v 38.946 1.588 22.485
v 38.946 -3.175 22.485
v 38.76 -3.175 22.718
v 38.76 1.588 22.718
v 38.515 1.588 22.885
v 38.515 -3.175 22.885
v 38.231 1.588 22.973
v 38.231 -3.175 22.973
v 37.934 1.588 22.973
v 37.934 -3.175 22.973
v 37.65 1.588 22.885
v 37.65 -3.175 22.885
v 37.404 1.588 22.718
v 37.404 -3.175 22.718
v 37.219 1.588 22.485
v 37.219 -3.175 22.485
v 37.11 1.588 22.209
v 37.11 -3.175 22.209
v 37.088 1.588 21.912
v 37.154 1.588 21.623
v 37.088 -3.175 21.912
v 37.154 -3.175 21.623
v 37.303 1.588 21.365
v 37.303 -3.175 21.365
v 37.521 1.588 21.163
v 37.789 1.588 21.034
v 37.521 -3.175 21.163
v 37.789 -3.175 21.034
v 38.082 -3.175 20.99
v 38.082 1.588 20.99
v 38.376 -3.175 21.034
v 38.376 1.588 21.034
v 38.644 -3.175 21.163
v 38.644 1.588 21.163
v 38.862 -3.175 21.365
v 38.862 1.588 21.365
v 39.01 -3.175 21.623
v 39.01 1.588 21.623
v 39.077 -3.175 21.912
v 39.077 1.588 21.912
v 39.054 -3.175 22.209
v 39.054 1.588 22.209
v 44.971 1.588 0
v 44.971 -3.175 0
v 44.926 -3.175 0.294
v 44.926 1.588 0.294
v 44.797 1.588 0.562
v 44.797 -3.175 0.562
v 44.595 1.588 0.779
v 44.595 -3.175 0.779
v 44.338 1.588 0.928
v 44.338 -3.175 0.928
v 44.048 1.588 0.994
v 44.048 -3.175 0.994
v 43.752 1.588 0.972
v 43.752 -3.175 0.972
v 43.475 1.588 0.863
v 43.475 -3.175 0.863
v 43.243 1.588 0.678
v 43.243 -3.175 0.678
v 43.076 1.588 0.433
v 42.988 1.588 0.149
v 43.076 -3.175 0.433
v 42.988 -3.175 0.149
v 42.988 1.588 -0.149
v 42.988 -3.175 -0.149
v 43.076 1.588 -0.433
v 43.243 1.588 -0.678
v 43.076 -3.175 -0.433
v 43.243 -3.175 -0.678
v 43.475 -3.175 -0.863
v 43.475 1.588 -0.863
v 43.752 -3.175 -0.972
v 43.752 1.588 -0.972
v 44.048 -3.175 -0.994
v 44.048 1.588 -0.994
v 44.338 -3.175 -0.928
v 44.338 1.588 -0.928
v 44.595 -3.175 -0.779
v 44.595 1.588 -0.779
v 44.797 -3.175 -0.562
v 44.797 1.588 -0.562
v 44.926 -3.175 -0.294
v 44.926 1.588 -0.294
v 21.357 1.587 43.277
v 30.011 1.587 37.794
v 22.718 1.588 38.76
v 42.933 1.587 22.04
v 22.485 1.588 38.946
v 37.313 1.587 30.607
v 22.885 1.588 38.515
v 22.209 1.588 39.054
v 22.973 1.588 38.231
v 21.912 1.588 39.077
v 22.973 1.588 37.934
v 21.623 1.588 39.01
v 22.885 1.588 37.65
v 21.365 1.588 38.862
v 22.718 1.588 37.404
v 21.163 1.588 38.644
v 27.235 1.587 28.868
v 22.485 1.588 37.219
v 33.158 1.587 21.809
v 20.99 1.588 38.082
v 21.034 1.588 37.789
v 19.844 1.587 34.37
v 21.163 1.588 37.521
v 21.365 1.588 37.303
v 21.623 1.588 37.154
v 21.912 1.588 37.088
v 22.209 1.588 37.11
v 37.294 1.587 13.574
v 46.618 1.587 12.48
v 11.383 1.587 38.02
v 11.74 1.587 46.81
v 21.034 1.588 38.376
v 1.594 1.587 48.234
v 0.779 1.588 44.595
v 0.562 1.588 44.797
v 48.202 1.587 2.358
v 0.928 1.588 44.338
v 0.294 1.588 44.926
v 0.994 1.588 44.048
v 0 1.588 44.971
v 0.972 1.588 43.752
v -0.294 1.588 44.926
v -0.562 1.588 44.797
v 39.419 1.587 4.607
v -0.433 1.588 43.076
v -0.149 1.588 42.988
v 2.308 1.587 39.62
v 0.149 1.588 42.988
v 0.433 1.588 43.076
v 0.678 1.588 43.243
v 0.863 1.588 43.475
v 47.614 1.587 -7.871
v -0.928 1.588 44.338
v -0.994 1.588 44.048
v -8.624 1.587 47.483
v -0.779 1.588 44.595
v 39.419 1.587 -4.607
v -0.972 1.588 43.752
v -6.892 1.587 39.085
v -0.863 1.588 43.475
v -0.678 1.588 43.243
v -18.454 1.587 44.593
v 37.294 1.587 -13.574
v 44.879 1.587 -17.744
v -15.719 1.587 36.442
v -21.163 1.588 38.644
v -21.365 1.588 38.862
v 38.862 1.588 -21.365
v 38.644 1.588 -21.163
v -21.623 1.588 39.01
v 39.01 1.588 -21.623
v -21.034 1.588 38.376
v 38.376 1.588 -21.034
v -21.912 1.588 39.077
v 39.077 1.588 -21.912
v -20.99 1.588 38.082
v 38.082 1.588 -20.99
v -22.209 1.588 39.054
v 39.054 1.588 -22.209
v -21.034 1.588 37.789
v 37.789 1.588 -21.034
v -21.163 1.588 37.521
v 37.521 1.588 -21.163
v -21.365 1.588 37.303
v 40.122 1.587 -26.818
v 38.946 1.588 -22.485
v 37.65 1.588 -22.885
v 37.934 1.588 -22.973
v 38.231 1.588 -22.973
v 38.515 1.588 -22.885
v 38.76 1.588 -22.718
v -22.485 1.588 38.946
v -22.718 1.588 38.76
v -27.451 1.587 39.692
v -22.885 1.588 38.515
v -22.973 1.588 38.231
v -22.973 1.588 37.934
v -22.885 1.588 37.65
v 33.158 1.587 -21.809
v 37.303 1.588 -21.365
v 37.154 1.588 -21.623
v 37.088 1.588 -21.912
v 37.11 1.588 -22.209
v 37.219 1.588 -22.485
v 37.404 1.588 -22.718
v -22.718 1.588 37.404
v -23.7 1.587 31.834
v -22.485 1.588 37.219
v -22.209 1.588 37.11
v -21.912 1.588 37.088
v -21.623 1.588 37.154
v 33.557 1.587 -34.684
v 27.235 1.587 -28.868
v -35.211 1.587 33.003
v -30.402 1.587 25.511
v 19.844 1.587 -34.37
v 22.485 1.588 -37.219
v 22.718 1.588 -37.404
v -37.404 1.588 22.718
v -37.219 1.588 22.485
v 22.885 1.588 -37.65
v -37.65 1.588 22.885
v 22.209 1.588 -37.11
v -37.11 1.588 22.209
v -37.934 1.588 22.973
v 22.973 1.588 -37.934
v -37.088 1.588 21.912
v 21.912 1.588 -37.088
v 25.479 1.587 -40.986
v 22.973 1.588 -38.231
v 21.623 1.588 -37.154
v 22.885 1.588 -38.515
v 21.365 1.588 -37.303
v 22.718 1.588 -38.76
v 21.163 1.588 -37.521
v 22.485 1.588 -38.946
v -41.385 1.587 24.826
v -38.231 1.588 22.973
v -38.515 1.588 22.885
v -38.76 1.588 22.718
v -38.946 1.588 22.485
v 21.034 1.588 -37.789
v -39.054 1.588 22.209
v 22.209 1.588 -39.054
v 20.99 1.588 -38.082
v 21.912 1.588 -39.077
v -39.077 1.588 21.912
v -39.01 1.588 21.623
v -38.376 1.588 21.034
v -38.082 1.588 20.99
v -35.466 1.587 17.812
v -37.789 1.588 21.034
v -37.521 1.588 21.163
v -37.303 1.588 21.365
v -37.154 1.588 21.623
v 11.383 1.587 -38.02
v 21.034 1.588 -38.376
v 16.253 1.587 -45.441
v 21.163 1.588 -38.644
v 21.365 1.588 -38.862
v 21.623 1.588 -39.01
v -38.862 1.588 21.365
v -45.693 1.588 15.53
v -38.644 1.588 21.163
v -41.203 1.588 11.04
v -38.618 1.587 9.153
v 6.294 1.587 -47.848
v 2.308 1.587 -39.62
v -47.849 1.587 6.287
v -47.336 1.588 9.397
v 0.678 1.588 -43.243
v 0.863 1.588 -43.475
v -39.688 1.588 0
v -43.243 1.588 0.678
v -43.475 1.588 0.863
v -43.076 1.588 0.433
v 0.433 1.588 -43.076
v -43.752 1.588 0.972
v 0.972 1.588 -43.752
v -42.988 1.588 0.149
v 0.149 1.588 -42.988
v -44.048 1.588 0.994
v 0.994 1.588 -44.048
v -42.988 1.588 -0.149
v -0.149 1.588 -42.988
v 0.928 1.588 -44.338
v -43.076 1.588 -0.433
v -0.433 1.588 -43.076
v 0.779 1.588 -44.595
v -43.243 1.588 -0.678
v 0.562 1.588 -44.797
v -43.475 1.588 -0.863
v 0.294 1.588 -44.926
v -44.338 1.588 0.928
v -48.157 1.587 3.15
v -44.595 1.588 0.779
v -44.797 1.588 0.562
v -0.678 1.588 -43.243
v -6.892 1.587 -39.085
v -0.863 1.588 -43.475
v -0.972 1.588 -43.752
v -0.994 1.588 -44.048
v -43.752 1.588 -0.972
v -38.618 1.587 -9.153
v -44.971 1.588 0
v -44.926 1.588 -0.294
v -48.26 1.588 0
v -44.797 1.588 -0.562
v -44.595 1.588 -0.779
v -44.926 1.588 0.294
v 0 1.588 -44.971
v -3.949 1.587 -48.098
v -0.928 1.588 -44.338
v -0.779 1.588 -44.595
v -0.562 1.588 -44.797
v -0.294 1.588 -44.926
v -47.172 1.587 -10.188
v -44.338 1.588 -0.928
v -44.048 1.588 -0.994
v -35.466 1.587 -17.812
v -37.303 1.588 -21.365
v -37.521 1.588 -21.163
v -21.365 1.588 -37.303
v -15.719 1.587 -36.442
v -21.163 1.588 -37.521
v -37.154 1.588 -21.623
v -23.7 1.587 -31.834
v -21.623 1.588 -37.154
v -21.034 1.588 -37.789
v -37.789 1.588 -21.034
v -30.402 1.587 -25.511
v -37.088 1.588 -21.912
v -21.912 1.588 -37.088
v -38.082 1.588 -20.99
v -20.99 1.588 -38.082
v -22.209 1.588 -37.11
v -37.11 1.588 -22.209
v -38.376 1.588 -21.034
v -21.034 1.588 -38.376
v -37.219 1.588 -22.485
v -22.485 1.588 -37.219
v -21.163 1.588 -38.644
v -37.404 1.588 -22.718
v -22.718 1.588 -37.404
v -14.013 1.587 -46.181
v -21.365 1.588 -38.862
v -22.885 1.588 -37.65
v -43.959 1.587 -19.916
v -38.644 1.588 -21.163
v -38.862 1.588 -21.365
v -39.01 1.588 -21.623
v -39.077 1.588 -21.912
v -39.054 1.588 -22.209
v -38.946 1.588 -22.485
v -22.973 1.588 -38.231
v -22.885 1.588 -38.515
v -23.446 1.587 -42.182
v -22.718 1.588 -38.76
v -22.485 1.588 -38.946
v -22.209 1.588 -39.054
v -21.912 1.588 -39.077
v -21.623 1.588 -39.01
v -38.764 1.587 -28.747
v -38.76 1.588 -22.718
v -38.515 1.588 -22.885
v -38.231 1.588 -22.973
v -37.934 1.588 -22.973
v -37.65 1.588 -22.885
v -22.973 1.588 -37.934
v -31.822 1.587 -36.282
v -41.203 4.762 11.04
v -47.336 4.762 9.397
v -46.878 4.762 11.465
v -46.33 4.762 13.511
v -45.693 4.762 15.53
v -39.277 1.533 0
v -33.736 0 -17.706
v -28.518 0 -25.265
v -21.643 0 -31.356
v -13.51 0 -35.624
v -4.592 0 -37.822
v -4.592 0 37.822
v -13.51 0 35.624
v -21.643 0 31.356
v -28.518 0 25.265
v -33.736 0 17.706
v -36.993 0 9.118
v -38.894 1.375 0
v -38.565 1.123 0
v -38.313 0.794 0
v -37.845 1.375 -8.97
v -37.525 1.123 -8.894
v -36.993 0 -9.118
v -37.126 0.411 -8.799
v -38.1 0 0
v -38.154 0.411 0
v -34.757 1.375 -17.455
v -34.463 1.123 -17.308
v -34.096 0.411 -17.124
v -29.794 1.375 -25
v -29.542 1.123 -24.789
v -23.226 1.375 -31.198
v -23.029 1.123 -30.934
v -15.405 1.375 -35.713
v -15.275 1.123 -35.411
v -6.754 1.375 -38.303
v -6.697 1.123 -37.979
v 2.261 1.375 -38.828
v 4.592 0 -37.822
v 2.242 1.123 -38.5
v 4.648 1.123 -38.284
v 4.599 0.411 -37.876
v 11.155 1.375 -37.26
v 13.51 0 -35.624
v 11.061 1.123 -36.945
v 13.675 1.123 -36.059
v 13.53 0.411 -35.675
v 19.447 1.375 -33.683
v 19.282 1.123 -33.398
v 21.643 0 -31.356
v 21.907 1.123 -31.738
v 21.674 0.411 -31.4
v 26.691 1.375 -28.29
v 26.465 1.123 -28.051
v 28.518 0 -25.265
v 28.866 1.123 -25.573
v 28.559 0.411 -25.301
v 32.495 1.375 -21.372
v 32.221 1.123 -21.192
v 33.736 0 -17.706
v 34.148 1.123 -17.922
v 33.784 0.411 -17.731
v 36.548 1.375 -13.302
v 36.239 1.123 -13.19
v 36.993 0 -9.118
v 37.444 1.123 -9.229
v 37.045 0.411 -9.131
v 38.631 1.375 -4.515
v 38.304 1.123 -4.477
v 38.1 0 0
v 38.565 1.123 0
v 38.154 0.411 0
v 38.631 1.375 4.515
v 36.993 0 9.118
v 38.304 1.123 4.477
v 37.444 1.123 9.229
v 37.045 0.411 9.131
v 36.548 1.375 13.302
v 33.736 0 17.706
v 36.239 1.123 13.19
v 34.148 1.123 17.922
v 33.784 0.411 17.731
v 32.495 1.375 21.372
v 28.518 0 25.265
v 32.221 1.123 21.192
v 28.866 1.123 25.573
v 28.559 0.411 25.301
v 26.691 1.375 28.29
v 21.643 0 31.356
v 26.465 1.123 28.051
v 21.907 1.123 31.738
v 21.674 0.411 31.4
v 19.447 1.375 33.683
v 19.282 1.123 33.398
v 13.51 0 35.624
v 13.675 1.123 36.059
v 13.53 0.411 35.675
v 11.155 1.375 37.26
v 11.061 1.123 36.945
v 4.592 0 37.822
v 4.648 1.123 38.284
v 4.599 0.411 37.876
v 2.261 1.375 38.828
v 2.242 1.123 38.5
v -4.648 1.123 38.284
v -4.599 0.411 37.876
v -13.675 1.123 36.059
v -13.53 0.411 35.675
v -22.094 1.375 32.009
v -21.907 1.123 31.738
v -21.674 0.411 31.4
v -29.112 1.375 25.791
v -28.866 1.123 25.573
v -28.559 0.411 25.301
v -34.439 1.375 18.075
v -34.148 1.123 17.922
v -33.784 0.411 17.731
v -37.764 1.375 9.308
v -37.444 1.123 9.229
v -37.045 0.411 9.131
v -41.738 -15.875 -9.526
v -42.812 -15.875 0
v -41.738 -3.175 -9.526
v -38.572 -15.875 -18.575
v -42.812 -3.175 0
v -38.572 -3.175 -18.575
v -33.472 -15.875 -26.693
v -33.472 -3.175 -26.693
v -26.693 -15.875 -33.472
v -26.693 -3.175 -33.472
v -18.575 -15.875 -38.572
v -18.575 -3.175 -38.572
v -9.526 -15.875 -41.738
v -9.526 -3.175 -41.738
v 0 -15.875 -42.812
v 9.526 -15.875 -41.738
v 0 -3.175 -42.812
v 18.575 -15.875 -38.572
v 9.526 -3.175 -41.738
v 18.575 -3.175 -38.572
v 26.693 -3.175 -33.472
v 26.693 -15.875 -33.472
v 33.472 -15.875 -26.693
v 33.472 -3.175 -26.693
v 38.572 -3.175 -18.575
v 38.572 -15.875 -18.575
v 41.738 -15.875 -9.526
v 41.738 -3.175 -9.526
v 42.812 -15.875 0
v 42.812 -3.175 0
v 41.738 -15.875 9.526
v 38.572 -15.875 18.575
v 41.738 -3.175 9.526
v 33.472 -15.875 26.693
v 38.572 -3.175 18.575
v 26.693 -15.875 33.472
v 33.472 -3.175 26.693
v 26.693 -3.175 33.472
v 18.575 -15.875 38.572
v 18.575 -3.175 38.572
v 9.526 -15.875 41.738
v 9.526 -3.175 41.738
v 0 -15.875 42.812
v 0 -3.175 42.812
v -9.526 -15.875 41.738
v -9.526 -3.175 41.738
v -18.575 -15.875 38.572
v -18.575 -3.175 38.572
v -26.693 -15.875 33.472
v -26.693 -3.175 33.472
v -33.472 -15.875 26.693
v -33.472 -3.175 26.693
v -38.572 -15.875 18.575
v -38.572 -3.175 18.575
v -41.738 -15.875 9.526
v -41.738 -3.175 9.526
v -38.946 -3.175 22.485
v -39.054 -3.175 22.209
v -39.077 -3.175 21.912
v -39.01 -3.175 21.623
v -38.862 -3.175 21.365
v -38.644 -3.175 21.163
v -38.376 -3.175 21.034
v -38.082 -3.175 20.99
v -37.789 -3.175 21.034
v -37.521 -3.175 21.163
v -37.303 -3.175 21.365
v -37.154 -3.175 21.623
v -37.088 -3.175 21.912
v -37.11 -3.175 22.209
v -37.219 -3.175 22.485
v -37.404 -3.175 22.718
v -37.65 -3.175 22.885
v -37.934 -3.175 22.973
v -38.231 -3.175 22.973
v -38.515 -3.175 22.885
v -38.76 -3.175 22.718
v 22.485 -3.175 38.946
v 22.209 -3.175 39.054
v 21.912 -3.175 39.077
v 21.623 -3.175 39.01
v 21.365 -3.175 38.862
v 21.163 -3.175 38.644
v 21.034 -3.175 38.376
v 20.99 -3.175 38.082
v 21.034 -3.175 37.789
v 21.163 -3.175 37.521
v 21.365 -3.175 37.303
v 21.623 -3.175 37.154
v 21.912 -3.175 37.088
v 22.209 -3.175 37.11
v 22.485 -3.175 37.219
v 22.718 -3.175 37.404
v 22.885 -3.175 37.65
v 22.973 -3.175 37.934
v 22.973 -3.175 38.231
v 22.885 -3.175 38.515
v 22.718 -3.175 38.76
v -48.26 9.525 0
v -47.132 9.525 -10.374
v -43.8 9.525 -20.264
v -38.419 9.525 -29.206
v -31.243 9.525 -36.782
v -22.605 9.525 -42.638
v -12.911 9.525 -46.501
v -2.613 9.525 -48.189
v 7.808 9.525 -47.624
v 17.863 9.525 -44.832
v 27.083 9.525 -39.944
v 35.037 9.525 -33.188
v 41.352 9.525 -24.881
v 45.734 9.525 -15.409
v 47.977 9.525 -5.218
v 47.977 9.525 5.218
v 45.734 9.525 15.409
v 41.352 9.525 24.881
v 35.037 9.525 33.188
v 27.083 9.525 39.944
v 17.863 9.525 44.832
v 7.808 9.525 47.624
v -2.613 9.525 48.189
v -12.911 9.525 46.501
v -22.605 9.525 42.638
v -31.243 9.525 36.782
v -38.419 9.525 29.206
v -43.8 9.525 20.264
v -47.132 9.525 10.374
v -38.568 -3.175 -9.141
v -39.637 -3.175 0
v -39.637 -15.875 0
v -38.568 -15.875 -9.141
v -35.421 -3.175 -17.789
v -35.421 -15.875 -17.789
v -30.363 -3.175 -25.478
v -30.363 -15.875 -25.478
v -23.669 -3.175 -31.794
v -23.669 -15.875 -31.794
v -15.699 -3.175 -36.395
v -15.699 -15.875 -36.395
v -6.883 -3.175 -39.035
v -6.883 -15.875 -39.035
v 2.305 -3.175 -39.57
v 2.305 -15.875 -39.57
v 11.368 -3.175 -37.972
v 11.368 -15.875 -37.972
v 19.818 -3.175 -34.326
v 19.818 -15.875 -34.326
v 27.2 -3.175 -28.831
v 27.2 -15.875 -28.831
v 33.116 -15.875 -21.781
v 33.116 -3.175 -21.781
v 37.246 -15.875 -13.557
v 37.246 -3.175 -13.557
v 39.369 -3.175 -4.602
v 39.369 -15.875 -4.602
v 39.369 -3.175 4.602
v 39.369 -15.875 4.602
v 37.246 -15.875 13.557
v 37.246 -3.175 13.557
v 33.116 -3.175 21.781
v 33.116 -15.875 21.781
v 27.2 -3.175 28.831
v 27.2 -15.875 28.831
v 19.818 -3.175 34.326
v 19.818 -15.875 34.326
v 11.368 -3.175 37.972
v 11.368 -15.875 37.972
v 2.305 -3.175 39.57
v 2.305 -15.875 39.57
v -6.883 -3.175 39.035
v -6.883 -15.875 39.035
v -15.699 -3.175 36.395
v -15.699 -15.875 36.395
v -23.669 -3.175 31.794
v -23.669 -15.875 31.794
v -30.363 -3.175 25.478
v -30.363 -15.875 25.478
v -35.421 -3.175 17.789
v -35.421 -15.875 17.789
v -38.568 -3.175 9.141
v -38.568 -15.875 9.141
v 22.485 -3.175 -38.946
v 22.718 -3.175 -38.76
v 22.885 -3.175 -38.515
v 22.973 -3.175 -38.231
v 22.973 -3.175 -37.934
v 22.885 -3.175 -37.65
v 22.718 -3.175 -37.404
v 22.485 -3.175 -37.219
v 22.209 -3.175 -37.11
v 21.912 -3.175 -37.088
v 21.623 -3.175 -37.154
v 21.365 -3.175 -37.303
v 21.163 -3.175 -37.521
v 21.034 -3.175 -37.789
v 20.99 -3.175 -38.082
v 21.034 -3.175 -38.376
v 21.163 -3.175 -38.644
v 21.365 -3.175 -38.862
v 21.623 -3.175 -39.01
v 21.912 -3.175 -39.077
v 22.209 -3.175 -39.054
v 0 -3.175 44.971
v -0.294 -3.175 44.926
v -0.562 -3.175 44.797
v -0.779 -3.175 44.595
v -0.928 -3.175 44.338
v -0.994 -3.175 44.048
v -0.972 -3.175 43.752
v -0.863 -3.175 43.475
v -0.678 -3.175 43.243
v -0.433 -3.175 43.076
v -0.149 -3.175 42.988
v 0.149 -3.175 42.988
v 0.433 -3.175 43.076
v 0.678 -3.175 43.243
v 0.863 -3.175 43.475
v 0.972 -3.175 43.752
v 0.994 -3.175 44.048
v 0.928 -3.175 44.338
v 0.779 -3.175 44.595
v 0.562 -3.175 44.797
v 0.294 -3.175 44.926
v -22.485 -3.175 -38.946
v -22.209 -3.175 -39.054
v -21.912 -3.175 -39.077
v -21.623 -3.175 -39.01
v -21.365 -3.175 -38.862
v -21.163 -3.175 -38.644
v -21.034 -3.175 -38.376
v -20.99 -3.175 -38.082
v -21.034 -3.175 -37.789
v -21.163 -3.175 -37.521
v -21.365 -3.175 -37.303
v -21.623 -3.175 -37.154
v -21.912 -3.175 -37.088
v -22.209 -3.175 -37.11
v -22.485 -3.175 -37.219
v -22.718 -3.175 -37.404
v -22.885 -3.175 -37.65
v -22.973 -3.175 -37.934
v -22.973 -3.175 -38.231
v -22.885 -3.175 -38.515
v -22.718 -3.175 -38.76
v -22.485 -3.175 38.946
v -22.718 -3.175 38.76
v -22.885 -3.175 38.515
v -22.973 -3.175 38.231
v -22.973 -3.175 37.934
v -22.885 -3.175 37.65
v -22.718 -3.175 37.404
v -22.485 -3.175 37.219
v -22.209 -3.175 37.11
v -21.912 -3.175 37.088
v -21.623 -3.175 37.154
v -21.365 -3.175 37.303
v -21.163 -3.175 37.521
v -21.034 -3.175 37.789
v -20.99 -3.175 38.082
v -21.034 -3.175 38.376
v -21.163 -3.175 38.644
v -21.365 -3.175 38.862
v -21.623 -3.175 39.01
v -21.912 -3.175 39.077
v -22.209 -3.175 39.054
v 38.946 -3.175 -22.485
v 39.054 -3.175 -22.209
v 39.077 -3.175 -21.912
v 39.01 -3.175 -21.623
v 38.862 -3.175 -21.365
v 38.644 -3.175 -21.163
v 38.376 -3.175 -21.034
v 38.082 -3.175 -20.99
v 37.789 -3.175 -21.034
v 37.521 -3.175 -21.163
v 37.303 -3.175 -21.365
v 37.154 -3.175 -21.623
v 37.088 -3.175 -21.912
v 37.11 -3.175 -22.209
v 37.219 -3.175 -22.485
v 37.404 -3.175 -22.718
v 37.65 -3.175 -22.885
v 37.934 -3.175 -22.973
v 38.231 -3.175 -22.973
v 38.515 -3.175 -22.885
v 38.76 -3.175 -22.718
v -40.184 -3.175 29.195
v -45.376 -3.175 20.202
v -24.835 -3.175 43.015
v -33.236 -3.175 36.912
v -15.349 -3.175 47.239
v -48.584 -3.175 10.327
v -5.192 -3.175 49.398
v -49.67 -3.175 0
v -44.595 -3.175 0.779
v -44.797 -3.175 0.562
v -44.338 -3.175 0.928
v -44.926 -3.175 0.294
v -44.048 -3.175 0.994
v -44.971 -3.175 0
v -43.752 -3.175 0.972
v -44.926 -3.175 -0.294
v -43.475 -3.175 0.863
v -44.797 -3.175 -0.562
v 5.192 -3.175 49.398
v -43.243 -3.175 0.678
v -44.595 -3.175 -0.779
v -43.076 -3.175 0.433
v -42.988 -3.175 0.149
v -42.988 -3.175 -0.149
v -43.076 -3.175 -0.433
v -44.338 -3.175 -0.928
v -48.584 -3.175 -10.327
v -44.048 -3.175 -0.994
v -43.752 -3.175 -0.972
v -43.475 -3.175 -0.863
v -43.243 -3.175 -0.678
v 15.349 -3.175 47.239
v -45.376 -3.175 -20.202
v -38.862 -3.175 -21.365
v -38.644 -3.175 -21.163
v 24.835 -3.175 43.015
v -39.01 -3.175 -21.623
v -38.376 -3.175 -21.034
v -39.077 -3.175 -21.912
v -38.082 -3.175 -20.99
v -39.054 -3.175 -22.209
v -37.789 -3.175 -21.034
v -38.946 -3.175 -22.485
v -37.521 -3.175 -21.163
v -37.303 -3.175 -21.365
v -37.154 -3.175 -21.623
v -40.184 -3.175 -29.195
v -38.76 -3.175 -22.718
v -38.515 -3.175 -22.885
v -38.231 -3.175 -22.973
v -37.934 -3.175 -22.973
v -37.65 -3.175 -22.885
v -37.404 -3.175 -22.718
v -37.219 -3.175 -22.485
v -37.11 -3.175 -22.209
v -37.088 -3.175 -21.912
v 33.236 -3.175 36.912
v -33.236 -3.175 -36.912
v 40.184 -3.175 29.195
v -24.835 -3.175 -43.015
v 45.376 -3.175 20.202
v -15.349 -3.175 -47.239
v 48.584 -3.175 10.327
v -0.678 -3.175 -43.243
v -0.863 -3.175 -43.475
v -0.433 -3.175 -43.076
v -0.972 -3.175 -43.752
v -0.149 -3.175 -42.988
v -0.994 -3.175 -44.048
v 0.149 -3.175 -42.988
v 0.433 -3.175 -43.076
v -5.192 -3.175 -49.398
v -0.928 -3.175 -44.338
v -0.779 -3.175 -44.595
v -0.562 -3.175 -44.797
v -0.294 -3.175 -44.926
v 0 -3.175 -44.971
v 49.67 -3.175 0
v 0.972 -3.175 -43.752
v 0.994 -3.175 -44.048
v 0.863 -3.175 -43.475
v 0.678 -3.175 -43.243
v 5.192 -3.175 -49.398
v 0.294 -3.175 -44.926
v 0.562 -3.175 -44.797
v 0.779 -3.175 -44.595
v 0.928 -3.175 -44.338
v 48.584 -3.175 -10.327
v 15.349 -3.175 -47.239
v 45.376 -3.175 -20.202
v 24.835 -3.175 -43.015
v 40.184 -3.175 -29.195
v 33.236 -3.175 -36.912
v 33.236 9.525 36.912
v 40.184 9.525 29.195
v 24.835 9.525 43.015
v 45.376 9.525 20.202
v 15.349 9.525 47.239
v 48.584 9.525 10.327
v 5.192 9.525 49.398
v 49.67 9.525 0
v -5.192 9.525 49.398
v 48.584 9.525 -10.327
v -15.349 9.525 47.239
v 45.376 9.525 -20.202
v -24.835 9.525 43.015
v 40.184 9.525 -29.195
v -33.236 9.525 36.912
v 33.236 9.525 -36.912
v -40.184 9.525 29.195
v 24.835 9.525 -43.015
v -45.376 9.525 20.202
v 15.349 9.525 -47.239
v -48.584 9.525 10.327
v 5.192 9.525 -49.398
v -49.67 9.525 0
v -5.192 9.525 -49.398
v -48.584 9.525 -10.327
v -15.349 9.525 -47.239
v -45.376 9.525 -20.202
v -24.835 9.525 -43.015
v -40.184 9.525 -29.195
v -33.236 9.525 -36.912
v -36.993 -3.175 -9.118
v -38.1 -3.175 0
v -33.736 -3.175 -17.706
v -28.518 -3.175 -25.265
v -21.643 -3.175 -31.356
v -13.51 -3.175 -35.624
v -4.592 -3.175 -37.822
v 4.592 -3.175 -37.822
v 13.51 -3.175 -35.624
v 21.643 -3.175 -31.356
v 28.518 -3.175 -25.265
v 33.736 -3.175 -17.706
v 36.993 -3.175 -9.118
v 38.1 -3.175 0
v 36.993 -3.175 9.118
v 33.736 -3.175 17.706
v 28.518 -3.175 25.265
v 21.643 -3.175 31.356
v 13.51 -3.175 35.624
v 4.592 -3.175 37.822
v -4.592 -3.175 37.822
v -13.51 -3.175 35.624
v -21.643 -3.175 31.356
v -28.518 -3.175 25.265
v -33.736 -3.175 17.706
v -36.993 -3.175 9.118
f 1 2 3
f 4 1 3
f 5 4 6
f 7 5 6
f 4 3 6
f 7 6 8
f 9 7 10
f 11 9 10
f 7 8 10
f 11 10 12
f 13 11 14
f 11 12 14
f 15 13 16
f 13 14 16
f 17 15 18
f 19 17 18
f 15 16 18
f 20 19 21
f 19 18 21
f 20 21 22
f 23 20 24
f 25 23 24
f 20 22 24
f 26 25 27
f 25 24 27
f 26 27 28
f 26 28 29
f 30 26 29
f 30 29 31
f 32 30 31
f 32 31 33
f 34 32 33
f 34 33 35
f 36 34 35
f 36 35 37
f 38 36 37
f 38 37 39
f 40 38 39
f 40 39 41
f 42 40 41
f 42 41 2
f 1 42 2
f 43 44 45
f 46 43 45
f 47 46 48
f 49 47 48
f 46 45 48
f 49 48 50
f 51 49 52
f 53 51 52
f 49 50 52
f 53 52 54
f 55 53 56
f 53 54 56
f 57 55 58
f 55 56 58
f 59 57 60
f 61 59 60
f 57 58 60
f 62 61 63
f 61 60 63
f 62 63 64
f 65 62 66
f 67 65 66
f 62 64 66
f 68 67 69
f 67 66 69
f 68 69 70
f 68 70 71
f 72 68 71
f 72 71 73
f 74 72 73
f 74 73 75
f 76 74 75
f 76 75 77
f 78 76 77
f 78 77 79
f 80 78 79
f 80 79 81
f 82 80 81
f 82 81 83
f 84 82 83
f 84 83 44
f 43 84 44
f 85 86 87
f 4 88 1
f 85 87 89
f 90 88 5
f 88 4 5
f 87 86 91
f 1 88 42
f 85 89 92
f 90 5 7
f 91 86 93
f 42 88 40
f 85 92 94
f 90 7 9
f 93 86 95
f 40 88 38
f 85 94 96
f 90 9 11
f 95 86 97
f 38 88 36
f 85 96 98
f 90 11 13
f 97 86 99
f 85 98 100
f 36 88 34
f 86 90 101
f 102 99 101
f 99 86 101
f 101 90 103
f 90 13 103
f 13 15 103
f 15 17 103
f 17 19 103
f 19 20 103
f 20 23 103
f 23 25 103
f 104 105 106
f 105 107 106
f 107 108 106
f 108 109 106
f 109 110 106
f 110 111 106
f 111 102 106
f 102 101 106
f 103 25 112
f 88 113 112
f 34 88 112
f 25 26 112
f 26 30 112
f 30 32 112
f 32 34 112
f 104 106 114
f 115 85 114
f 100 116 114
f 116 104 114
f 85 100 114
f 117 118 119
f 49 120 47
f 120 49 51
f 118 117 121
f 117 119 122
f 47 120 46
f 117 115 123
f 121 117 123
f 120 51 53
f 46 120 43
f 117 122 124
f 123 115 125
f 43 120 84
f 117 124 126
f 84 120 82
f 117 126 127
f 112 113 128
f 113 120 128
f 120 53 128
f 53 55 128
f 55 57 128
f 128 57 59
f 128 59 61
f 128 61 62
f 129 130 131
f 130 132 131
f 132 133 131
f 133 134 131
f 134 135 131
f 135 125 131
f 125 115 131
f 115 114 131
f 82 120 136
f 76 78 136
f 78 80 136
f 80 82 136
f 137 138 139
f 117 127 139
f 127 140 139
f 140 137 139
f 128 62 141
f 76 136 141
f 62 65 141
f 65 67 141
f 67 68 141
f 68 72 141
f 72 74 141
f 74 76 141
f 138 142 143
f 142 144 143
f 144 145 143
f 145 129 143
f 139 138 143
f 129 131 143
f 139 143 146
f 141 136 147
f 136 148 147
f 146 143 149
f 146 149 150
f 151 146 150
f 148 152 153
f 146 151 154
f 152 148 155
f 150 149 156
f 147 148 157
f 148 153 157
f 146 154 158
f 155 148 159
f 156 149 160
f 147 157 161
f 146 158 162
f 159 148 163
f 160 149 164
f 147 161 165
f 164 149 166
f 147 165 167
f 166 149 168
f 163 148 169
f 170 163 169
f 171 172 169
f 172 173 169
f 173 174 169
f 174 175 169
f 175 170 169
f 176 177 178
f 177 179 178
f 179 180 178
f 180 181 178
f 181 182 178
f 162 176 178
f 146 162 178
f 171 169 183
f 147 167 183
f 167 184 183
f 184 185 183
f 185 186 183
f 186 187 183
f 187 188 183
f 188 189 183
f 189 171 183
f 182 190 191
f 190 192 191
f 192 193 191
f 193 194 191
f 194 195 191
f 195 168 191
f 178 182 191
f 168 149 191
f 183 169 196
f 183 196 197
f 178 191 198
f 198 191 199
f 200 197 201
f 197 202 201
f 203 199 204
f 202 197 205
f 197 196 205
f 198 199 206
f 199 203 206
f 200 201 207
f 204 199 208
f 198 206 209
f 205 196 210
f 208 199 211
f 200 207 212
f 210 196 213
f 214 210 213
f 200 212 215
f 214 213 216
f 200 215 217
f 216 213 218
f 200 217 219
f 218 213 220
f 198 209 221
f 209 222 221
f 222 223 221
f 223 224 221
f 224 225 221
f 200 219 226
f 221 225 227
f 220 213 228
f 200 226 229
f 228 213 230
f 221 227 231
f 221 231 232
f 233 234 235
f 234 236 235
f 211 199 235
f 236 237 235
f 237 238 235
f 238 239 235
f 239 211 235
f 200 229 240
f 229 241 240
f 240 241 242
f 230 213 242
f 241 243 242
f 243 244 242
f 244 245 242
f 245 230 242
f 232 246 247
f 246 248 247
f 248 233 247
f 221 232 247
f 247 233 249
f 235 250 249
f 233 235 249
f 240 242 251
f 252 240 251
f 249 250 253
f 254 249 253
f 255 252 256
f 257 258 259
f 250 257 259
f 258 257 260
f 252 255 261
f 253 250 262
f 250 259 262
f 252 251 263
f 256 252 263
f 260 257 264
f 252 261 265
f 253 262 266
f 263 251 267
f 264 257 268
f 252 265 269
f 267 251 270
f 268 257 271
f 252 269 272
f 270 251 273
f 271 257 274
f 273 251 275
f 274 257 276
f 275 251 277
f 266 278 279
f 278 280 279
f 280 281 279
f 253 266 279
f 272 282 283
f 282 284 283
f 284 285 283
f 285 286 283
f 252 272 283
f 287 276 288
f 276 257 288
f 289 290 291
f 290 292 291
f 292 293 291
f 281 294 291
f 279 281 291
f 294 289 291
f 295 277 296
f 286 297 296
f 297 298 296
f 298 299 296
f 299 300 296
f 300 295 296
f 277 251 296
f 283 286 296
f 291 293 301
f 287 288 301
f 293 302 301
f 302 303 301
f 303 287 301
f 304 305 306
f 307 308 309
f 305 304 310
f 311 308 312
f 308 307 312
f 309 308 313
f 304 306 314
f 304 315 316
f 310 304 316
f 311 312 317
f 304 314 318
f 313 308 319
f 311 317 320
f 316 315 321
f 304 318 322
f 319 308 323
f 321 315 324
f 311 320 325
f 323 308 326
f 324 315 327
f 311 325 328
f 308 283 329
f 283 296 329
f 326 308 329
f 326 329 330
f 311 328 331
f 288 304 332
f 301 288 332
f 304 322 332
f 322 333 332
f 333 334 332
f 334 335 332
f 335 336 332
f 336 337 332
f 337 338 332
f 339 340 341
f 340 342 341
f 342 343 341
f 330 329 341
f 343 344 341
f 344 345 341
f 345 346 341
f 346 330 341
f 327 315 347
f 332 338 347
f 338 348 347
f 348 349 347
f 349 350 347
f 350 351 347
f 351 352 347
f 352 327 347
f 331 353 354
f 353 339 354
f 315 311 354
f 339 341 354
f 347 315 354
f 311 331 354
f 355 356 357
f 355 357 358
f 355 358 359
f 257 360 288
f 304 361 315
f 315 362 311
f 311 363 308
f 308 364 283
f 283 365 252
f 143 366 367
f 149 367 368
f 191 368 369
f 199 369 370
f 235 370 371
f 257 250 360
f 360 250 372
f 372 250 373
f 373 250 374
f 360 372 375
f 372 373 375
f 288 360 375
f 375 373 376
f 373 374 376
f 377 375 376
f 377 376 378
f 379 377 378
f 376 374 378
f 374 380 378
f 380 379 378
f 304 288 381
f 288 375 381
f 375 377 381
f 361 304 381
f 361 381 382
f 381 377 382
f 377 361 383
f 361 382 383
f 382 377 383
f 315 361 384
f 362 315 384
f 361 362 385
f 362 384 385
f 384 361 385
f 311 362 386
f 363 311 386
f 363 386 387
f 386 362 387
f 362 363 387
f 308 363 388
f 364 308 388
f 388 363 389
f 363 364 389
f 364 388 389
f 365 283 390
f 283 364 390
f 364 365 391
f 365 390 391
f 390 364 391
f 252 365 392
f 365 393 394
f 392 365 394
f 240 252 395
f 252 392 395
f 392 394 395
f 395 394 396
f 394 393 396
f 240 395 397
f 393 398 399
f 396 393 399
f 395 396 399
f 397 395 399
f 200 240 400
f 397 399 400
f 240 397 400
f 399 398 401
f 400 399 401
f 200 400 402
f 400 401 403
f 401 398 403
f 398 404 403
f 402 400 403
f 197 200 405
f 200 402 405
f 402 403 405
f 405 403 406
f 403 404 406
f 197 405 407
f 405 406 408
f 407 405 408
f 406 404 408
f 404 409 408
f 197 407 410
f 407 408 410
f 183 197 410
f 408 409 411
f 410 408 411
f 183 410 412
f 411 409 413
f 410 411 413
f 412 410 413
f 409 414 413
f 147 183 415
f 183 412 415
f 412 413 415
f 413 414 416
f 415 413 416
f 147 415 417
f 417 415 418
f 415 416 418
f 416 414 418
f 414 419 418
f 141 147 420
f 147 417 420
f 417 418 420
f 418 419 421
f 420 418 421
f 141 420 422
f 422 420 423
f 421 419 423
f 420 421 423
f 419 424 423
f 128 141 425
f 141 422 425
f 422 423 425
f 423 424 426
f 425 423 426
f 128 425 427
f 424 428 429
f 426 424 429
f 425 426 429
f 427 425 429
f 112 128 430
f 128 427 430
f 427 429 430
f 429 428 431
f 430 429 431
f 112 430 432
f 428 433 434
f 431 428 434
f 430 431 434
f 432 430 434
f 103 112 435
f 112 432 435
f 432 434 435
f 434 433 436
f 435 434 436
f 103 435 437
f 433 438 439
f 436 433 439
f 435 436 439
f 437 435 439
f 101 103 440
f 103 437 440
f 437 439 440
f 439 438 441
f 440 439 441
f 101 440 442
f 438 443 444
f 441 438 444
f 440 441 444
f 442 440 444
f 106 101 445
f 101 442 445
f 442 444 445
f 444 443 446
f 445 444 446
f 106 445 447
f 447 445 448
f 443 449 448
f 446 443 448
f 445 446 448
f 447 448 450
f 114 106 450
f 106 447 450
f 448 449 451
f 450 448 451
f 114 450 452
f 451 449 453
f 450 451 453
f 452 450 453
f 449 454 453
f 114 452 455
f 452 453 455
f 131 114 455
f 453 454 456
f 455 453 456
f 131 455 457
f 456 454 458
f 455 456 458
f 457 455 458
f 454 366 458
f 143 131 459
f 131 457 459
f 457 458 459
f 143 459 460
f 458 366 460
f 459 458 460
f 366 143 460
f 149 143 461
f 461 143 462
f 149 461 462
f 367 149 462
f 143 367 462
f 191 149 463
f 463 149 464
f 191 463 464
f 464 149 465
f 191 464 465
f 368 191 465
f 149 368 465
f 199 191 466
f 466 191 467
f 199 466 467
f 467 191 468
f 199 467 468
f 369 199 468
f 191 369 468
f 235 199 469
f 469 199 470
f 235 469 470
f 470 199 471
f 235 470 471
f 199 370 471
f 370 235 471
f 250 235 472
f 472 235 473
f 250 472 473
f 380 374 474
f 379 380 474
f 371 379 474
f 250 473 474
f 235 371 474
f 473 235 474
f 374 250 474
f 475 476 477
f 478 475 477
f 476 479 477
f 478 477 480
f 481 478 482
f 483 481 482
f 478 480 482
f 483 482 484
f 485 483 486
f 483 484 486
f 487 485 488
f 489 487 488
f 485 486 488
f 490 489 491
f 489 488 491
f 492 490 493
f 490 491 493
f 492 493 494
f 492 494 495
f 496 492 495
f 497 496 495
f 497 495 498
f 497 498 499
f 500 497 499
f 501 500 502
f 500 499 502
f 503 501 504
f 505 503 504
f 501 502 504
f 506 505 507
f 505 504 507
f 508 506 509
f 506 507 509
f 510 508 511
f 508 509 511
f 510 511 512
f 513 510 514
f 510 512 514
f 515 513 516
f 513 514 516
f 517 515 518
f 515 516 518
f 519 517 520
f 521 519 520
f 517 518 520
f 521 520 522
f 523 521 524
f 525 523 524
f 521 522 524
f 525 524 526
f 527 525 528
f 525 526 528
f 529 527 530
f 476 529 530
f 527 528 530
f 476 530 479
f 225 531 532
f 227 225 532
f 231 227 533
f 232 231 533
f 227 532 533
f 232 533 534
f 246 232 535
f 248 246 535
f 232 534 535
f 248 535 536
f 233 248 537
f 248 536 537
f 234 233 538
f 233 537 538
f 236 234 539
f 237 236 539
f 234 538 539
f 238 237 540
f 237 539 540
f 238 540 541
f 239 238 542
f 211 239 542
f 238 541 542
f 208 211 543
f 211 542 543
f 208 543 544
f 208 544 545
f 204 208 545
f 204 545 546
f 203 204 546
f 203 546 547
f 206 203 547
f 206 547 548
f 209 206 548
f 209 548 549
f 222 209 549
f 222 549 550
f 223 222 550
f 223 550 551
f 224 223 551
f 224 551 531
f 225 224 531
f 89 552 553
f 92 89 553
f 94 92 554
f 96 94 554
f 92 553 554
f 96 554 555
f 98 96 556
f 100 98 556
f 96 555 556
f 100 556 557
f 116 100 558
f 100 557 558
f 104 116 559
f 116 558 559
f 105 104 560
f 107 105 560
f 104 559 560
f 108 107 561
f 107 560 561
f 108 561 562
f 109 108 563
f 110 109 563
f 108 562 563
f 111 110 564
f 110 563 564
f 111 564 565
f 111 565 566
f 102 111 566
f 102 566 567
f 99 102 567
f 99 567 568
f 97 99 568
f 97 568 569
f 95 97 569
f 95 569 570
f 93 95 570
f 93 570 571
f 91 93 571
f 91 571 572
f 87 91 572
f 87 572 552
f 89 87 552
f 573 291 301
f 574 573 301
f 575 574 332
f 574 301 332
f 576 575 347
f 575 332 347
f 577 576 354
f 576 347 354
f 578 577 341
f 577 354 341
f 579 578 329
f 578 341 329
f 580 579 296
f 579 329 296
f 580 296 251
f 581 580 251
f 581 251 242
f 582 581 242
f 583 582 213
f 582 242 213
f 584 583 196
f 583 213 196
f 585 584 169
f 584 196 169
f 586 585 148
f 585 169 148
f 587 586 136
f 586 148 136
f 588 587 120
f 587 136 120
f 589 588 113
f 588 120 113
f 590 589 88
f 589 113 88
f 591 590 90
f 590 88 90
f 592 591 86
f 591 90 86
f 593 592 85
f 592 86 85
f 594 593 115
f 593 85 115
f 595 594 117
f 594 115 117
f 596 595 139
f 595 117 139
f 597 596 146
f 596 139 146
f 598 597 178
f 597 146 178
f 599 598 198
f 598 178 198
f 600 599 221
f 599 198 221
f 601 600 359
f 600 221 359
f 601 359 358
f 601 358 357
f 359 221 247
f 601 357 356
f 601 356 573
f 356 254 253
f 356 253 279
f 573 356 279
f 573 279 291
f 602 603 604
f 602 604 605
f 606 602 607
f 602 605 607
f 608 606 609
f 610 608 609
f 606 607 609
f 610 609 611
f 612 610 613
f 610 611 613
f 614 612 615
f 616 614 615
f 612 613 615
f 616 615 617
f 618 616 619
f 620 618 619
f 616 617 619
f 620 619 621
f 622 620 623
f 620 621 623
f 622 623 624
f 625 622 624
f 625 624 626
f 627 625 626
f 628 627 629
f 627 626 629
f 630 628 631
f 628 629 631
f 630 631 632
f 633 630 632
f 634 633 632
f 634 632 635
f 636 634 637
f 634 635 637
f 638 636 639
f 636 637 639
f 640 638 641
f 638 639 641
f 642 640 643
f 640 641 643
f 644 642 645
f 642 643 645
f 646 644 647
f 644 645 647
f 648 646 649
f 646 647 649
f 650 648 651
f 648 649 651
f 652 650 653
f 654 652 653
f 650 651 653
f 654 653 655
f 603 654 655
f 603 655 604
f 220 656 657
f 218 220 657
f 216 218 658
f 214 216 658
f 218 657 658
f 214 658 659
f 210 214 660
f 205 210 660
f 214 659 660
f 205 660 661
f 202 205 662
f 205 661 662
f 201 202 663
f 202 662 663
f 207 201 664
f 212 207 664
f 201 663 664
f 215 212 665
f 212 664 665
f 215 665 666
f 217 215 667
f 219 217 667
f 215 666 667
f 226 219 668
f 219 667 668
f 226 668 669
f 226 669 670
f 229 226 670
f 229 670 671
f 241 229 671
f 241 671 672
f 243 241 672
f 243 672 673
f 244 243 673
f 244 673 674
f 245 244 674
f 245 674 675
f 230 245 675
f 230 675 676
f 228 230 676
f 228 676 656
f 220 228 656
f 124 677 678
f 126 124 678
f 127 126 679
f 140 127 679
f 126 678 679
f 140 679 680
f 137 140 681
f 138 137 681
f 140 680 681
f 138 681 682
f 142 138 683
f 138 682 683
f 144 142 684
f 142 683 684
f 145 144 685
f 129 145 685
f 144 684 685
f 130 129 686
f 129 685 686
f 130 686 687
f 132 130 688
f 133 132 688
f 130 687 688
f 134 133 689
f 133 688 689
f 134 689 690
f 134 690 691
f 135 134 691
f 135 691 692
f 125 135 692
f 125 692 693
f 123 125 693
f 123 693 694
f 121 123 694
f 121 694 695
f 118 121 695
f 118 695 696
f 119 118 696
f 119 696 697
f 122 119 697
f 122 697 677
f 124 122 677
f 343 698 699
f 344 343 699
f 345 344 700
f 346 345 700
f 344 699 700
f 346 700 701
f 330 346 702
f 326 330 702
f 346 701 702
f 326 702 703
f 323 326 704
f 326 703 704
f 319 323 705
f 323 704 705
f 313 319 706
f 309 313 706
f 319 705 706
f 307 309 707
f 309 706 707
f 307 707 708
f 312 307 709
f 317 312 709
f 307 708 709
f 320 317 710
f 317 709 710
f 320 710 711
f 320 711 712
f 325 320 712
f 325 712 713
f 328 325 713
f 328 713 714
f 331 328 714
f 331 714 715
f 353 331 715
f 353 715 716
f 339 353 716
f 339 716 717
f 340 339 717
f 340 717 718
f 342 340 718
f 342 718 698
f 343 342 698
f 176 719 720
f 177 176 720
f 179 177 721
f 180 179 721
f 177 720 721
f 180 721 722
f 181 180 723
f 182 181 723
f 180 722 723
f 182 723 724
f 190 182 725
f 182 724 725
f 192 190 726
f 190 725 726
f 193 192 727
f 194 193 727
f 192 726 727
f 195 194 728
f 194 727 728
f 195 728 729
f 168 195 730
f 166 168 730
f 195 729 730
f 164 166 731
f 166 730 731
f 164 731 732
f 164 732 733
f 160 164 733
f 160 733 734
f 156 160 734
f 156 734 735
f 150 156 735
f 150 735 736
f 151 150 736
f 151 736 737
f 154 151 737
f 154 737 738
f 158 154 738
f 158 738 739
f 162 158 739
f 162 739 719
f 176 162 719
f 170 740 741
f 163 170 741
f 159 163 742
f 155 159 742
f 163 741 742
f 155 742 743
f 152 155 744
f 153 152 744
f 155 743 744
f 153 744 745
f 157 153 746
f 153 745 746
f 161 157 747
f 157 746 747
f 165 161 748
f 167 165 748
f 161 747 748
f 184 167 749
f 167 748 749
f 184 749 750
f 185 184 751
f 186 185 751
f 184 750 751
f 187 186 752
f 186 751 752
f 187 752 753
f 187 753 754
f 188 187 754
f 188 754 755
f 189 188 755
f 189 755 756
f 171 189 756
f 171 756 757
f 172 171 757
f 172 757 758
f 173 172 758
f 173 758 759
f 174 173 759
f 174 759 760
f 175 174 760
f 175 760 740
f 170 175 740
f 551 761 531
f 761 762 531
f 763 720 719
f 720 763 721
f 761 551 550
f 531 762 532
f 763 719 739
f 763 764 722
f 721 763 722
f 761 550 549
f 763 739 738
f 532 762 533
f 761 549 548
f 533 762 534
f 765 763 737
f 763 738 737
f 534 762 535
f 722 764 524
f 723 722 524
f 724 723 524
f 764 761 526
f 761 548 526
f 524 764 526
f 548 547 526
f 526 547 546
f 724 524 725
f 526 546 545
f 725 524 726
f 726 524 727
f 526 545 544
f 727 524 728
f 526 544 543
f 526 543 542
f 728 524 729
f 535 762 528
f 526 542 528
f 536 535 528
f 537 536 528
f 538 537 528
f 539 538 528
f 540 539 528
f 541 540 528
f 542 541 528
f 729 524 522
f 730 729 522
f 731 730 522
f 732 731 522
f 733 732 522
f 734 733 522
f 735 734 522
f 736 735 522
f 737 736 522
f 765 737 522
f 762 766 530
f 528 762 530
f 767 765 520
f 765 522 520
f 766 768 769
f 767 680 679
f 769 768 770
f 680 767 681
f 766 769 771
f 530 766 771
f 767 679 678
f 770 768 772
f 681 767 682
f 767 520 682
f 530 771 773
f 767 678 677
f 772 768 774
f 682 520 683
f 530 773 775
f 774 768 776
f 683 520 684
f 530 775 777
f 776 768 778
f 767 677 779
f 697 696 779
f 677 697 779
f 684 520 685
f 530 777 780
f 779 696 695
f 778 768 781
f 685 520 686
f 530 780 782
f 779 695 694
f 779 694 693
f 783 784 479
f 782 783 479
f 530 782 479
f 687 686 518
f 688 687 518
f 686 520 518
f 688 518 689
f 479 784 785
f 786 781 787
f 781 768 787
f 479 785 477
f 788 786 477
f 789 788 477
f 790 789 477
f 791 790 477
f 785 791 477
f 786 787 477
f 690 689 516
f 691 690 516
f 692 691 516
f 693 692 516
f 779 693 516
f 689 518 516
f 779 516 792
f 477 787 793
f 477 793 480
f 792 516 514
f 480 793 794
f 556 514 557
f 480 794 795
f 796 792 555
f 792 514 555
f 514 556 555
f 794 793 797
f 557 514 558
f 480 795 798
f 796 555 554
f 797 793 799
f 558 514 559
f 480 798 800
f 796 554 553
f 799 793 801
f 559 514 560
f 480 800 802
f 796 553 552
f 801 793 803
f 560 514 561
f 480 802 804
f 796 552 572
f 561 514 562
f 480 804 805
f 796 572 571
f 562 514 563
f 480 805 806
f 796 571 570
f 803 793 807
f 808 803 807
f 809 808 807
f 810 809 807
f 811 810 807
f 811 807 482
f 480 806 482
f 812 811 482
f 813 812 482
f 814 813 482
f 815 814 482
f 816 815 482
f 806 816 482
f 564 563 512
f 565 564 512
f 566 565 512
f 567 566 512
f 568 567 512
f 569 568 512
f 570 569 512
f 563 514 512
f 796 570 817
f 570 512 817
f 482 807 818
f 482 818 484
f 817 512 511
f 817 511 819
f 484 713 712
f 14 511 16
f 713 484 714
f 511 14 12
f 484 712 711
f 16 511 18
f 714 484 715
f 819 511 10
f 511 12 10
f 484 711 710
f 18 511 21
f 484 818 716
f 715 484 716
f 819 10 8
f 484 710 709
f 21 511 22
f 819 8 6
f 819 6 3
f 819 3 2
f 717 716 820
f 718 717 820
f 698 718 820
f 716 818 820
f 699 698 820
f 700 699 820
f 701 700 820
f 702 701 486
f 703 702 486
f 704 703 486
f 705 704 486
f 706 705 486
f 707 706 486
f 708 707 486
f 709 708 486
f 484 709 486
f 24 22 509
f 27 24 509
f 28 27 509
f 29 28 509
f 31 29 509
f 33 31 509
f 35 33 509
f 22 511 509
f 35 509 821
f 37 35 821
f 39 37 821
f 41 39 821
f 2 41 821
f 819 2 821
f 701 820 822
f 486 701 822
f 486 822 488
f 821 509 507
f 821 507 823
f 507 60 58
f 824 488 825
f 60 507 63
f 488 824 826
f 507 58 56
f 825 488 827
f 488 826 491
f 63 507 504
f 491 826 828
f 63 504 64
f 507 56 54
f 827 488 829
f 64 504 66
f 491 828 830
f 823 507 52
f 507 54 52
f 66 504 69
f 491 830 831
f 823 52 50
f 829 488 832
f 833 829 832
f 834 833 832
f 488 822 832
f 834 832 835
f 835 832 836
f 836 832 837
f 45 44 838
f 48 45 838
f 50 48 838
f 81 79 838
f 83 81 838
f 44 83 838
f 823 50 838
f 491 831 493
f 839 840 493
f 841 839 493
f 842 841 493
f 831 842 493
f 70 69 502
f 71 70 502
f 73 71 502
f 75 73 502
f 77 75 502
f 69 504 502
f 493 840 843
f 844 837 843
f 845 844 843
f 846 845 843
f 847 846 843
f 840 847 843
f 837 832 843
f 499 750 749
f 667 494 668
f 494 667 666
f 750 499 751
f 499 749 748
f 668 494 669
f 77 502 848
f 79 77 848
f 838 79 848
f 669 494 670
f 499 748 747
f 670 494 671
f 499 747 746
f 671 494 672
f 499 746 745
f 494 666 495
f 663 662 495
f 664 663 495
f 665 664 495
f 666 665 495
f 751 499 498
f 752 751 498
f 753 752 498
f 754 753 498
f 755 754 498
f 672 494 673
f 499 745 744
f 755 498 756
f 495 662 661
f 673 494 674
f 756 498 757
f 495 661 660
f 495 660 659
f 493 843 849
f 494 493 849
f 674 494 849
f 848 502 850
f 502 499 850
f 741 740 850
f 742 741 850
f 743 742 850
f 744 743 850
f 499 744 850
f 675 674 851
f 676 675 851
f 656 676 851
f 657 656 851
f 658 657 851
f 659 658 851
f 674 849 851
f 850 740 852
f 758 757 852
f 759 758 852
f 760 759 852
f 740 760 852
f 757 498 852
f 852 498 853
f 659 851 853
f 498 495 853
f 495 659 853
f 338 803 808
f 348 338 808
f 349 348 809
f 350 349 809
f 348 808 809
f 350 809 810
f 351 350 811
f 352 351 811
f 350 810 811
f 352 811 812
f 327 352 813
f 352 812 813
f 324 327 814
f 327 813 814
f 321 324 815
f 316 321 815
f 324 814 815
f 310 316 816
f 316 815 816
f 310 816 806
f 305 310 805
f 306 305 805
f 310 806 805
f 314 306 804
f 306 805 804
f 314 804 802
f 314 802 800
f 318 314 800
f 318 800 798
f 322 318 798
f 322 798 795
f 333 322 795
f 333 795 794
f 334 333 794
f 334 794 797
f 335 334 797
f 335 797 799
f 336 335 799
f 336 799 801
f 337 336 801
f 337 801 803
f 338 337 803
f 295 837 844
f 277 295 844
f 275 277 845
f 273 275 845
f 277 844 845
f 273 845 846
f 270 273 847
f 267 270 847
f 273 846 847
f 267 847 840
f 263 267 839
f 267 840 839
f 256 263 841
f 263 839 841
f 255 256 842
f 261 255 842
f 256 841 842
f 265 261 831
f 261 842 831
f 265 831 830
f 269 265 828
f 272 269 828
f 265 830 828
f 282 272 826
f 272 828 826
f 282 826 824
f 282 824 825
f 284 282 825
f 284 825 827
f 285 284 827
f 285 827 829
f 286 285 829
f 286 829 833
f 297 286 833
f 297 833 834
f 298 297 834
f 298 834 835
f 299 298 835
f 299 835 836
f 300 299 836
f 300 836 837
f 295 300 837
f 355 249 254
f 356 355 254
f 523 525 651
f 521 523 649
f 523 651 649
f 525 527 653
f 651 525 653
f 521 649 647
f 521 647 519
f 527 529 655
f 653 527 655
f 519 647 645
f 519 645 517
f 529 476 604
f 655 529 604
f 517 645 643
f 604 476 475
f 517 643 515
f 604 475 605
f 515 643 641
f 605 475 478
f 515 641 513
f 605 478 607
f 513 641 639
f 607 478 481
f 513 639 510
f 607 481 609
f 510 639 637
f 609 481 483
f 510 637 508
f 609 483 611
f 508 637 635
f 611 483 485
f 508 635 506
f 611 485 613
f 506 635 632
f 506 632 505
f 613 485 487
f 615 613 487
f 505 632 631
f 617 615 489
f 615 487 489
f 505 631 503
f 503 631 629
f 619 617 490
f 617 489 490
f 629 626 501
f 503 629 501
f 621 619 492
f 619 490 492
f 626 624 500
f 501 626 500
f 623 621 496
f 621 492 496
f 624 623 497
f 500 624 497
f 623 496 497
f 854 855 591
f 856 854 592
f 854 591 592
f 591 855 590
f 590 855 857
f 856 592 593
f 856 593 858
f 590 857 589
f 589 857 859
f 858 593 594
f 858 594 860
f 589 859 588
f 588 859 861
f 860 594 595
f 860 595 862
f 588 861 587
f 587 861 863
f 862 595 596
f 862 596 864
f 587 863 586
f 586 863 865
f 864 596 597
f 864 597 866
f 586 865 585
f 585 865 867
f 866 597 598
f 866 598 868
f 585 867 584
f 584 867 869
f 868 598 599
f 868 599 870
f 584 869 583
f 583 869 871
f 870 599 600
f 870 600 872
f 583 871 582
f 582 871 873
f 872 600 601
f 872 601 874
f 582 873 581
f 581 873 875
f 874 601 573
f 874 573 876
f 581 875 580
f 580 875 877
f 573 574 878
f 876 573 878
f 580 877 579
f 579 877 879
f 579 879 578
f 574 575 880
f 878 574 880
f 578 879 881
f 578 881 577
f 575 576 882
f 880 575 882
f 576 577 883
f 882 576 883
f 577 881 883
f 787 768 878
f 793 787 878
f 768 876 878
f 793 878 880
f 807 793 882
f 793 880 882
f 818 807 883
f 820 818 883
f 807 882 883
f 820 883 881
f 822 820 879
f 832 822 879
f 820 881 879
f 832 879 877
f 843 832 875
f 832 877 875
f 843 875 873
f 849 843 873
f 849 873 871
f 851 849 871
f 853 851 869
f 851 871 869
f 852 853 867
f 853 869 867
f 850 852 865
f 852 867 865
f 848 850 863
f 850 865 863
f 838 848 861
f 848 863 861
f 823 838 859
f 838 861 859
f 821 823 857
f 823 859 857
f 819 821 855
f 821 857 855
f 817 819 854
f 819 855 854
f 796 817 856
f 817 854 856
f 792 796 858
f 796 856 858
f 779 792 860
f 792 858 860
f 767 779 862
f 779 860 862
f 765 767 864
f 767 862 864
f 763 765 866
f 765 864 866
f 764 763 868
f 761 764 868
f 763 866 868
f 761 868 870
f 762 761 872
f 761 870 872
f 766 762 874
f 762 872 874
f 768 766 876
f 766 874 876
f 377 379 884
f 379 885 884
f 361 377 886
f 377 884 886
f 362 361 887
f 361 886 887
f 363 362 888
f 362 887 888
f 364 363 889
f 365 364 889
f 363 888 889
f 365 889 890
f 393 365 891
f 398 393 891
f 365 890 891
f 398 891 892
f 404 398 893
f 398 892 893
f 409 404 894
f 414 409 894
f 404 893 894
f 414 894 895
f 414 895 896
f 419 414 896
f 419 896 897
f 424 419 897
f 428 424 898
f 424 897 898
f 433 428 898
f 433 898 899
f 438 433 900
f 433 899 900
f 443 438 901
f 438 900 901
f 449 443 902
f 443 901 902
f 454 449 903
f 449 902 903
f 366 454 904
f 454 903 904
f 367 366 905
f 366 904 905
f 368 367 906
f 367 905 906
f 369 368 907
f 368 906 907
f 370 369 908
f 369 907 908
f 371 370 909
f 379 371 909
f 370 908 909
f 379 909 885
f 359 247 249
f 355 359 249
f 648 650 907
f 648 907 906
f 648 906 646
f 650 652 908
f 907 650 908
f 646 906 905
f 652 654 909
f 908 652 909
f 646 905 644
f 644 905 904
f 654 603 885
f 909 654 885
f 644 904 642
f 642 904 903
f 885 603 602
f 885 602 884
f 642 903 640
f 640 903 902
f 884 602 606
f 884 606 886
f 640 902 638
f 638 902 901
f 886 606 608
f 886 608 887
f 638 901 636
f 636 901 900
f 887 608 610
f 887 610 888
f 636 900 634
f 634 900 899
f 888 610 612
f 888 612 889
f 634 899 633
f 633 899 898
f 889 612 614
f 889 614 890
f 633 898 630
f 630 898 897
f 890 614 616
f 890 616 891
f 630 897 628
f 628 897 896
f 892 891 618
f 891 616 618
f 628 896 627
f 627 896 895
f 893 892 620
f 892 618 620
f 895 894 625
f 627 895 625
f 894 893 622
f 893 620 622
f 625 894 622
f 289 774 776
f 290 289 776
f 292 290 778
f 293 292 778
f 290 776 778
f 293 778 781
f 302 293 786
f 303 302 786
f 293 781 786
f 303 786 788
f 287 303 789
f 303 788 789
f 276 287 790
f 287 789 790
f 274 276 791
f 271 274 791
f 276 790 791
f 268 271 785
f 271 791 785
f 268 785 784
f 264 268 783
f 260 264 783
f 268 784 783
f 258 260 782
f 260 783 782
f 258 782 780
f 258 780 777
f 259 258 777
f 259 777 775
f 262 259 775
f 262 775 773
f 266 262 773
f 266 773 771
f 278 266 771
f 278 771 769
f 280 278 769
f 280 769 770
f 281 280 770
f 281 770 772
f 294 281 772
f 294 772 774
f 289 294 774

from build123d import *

# Parameters (mm, degrees)
F_3_48_TAPPED_HOLE1_D = 1.9939
CIRPATTERN1_COUNT     = 12
BOSS_EXTRUDE1_DEPTH   = 3.175


with BuildPart() as part:
    # Cross Section → Main (revolve)
    with BuildSketch(Plane.XY):
        with BuildLine():
            Line((-38.1, 0), (-38.1, -3.175))
            Line((-38.1, -3.175), (-39.6367, -3.175))
            Line((-39.6367, -3.175), (-39.6367, -15.875))
            Line((-39.6367, -15.875), (-42.8117, -15.875))
            Line((-42.8117, -15.875), (-42.8117, -3.175))
            Line((-42.8117, -3.175), (-49.6697, -3.175))
            Line((-49.6697, -3.175), (-49.6697, 9.525))
            Line((-49.6697, 9.525), (-48.26, 9.525))
            Line((-48.26, 9.525), (-48.26, 1.5875))
            Line((-48.26, 1.5875), (-39.6875, 1.5875))
            ThreePointArc((-39.6875, 1.5875), (-38.564967985, 1.122532015), (-38.1, 0))
        make_face()
    revolve(axis=Axis((0, 55, 0), (0, -1, 0)))

    # #3-48 Tapped Hole1 (through all)
    with Locations(Plane(origin=(0, 1.5875, 0), x_dir=(1, 0, 0), z_dir=(0, 1, 0))):
        with Locations((-43.97375, 0)):
            f_3_48_tapped_hole1 = Hole(F_3_48_TAPPED_HOLE1_D / 2)

    # CirPattern1: #3-48 Tapped Hole1 ×12 about axis
    cirpattern1_axis = Axis((0, 0, 0), (0, 1, 0))
    for i in range(1, CIRPATTERN1_COUNT):
        add(f_3_48_tapped_hole1.rotate(cirpattern1_axis, i * 360 / CIRPATTERN1_COUNT), mode=Mode.SUBTRACT)

    # Sketch3 → Boss-Extrude1 (add)
    with BuildSketch(Plane(origin=(0, 1.5875, 0), x_dir=(1, 0, 0), z_dir=(0, 1, 0))):
        with BuildLine():
            Line((-45.692838455, -15.530361037), (-41.202710394, -11.040232976))
            Line((-41.202710394, -11.040232976), (-47.336339391, -9.39673204))
            ThreePointArc((-47.336339391, -9.39673204), (-46.615580377, -12.490607117), (-45.692838455, -15.530361037))
        make_face()
    extrude(amount=BOSS_EXTRUDE1_DEPTH)


solid = part.part
